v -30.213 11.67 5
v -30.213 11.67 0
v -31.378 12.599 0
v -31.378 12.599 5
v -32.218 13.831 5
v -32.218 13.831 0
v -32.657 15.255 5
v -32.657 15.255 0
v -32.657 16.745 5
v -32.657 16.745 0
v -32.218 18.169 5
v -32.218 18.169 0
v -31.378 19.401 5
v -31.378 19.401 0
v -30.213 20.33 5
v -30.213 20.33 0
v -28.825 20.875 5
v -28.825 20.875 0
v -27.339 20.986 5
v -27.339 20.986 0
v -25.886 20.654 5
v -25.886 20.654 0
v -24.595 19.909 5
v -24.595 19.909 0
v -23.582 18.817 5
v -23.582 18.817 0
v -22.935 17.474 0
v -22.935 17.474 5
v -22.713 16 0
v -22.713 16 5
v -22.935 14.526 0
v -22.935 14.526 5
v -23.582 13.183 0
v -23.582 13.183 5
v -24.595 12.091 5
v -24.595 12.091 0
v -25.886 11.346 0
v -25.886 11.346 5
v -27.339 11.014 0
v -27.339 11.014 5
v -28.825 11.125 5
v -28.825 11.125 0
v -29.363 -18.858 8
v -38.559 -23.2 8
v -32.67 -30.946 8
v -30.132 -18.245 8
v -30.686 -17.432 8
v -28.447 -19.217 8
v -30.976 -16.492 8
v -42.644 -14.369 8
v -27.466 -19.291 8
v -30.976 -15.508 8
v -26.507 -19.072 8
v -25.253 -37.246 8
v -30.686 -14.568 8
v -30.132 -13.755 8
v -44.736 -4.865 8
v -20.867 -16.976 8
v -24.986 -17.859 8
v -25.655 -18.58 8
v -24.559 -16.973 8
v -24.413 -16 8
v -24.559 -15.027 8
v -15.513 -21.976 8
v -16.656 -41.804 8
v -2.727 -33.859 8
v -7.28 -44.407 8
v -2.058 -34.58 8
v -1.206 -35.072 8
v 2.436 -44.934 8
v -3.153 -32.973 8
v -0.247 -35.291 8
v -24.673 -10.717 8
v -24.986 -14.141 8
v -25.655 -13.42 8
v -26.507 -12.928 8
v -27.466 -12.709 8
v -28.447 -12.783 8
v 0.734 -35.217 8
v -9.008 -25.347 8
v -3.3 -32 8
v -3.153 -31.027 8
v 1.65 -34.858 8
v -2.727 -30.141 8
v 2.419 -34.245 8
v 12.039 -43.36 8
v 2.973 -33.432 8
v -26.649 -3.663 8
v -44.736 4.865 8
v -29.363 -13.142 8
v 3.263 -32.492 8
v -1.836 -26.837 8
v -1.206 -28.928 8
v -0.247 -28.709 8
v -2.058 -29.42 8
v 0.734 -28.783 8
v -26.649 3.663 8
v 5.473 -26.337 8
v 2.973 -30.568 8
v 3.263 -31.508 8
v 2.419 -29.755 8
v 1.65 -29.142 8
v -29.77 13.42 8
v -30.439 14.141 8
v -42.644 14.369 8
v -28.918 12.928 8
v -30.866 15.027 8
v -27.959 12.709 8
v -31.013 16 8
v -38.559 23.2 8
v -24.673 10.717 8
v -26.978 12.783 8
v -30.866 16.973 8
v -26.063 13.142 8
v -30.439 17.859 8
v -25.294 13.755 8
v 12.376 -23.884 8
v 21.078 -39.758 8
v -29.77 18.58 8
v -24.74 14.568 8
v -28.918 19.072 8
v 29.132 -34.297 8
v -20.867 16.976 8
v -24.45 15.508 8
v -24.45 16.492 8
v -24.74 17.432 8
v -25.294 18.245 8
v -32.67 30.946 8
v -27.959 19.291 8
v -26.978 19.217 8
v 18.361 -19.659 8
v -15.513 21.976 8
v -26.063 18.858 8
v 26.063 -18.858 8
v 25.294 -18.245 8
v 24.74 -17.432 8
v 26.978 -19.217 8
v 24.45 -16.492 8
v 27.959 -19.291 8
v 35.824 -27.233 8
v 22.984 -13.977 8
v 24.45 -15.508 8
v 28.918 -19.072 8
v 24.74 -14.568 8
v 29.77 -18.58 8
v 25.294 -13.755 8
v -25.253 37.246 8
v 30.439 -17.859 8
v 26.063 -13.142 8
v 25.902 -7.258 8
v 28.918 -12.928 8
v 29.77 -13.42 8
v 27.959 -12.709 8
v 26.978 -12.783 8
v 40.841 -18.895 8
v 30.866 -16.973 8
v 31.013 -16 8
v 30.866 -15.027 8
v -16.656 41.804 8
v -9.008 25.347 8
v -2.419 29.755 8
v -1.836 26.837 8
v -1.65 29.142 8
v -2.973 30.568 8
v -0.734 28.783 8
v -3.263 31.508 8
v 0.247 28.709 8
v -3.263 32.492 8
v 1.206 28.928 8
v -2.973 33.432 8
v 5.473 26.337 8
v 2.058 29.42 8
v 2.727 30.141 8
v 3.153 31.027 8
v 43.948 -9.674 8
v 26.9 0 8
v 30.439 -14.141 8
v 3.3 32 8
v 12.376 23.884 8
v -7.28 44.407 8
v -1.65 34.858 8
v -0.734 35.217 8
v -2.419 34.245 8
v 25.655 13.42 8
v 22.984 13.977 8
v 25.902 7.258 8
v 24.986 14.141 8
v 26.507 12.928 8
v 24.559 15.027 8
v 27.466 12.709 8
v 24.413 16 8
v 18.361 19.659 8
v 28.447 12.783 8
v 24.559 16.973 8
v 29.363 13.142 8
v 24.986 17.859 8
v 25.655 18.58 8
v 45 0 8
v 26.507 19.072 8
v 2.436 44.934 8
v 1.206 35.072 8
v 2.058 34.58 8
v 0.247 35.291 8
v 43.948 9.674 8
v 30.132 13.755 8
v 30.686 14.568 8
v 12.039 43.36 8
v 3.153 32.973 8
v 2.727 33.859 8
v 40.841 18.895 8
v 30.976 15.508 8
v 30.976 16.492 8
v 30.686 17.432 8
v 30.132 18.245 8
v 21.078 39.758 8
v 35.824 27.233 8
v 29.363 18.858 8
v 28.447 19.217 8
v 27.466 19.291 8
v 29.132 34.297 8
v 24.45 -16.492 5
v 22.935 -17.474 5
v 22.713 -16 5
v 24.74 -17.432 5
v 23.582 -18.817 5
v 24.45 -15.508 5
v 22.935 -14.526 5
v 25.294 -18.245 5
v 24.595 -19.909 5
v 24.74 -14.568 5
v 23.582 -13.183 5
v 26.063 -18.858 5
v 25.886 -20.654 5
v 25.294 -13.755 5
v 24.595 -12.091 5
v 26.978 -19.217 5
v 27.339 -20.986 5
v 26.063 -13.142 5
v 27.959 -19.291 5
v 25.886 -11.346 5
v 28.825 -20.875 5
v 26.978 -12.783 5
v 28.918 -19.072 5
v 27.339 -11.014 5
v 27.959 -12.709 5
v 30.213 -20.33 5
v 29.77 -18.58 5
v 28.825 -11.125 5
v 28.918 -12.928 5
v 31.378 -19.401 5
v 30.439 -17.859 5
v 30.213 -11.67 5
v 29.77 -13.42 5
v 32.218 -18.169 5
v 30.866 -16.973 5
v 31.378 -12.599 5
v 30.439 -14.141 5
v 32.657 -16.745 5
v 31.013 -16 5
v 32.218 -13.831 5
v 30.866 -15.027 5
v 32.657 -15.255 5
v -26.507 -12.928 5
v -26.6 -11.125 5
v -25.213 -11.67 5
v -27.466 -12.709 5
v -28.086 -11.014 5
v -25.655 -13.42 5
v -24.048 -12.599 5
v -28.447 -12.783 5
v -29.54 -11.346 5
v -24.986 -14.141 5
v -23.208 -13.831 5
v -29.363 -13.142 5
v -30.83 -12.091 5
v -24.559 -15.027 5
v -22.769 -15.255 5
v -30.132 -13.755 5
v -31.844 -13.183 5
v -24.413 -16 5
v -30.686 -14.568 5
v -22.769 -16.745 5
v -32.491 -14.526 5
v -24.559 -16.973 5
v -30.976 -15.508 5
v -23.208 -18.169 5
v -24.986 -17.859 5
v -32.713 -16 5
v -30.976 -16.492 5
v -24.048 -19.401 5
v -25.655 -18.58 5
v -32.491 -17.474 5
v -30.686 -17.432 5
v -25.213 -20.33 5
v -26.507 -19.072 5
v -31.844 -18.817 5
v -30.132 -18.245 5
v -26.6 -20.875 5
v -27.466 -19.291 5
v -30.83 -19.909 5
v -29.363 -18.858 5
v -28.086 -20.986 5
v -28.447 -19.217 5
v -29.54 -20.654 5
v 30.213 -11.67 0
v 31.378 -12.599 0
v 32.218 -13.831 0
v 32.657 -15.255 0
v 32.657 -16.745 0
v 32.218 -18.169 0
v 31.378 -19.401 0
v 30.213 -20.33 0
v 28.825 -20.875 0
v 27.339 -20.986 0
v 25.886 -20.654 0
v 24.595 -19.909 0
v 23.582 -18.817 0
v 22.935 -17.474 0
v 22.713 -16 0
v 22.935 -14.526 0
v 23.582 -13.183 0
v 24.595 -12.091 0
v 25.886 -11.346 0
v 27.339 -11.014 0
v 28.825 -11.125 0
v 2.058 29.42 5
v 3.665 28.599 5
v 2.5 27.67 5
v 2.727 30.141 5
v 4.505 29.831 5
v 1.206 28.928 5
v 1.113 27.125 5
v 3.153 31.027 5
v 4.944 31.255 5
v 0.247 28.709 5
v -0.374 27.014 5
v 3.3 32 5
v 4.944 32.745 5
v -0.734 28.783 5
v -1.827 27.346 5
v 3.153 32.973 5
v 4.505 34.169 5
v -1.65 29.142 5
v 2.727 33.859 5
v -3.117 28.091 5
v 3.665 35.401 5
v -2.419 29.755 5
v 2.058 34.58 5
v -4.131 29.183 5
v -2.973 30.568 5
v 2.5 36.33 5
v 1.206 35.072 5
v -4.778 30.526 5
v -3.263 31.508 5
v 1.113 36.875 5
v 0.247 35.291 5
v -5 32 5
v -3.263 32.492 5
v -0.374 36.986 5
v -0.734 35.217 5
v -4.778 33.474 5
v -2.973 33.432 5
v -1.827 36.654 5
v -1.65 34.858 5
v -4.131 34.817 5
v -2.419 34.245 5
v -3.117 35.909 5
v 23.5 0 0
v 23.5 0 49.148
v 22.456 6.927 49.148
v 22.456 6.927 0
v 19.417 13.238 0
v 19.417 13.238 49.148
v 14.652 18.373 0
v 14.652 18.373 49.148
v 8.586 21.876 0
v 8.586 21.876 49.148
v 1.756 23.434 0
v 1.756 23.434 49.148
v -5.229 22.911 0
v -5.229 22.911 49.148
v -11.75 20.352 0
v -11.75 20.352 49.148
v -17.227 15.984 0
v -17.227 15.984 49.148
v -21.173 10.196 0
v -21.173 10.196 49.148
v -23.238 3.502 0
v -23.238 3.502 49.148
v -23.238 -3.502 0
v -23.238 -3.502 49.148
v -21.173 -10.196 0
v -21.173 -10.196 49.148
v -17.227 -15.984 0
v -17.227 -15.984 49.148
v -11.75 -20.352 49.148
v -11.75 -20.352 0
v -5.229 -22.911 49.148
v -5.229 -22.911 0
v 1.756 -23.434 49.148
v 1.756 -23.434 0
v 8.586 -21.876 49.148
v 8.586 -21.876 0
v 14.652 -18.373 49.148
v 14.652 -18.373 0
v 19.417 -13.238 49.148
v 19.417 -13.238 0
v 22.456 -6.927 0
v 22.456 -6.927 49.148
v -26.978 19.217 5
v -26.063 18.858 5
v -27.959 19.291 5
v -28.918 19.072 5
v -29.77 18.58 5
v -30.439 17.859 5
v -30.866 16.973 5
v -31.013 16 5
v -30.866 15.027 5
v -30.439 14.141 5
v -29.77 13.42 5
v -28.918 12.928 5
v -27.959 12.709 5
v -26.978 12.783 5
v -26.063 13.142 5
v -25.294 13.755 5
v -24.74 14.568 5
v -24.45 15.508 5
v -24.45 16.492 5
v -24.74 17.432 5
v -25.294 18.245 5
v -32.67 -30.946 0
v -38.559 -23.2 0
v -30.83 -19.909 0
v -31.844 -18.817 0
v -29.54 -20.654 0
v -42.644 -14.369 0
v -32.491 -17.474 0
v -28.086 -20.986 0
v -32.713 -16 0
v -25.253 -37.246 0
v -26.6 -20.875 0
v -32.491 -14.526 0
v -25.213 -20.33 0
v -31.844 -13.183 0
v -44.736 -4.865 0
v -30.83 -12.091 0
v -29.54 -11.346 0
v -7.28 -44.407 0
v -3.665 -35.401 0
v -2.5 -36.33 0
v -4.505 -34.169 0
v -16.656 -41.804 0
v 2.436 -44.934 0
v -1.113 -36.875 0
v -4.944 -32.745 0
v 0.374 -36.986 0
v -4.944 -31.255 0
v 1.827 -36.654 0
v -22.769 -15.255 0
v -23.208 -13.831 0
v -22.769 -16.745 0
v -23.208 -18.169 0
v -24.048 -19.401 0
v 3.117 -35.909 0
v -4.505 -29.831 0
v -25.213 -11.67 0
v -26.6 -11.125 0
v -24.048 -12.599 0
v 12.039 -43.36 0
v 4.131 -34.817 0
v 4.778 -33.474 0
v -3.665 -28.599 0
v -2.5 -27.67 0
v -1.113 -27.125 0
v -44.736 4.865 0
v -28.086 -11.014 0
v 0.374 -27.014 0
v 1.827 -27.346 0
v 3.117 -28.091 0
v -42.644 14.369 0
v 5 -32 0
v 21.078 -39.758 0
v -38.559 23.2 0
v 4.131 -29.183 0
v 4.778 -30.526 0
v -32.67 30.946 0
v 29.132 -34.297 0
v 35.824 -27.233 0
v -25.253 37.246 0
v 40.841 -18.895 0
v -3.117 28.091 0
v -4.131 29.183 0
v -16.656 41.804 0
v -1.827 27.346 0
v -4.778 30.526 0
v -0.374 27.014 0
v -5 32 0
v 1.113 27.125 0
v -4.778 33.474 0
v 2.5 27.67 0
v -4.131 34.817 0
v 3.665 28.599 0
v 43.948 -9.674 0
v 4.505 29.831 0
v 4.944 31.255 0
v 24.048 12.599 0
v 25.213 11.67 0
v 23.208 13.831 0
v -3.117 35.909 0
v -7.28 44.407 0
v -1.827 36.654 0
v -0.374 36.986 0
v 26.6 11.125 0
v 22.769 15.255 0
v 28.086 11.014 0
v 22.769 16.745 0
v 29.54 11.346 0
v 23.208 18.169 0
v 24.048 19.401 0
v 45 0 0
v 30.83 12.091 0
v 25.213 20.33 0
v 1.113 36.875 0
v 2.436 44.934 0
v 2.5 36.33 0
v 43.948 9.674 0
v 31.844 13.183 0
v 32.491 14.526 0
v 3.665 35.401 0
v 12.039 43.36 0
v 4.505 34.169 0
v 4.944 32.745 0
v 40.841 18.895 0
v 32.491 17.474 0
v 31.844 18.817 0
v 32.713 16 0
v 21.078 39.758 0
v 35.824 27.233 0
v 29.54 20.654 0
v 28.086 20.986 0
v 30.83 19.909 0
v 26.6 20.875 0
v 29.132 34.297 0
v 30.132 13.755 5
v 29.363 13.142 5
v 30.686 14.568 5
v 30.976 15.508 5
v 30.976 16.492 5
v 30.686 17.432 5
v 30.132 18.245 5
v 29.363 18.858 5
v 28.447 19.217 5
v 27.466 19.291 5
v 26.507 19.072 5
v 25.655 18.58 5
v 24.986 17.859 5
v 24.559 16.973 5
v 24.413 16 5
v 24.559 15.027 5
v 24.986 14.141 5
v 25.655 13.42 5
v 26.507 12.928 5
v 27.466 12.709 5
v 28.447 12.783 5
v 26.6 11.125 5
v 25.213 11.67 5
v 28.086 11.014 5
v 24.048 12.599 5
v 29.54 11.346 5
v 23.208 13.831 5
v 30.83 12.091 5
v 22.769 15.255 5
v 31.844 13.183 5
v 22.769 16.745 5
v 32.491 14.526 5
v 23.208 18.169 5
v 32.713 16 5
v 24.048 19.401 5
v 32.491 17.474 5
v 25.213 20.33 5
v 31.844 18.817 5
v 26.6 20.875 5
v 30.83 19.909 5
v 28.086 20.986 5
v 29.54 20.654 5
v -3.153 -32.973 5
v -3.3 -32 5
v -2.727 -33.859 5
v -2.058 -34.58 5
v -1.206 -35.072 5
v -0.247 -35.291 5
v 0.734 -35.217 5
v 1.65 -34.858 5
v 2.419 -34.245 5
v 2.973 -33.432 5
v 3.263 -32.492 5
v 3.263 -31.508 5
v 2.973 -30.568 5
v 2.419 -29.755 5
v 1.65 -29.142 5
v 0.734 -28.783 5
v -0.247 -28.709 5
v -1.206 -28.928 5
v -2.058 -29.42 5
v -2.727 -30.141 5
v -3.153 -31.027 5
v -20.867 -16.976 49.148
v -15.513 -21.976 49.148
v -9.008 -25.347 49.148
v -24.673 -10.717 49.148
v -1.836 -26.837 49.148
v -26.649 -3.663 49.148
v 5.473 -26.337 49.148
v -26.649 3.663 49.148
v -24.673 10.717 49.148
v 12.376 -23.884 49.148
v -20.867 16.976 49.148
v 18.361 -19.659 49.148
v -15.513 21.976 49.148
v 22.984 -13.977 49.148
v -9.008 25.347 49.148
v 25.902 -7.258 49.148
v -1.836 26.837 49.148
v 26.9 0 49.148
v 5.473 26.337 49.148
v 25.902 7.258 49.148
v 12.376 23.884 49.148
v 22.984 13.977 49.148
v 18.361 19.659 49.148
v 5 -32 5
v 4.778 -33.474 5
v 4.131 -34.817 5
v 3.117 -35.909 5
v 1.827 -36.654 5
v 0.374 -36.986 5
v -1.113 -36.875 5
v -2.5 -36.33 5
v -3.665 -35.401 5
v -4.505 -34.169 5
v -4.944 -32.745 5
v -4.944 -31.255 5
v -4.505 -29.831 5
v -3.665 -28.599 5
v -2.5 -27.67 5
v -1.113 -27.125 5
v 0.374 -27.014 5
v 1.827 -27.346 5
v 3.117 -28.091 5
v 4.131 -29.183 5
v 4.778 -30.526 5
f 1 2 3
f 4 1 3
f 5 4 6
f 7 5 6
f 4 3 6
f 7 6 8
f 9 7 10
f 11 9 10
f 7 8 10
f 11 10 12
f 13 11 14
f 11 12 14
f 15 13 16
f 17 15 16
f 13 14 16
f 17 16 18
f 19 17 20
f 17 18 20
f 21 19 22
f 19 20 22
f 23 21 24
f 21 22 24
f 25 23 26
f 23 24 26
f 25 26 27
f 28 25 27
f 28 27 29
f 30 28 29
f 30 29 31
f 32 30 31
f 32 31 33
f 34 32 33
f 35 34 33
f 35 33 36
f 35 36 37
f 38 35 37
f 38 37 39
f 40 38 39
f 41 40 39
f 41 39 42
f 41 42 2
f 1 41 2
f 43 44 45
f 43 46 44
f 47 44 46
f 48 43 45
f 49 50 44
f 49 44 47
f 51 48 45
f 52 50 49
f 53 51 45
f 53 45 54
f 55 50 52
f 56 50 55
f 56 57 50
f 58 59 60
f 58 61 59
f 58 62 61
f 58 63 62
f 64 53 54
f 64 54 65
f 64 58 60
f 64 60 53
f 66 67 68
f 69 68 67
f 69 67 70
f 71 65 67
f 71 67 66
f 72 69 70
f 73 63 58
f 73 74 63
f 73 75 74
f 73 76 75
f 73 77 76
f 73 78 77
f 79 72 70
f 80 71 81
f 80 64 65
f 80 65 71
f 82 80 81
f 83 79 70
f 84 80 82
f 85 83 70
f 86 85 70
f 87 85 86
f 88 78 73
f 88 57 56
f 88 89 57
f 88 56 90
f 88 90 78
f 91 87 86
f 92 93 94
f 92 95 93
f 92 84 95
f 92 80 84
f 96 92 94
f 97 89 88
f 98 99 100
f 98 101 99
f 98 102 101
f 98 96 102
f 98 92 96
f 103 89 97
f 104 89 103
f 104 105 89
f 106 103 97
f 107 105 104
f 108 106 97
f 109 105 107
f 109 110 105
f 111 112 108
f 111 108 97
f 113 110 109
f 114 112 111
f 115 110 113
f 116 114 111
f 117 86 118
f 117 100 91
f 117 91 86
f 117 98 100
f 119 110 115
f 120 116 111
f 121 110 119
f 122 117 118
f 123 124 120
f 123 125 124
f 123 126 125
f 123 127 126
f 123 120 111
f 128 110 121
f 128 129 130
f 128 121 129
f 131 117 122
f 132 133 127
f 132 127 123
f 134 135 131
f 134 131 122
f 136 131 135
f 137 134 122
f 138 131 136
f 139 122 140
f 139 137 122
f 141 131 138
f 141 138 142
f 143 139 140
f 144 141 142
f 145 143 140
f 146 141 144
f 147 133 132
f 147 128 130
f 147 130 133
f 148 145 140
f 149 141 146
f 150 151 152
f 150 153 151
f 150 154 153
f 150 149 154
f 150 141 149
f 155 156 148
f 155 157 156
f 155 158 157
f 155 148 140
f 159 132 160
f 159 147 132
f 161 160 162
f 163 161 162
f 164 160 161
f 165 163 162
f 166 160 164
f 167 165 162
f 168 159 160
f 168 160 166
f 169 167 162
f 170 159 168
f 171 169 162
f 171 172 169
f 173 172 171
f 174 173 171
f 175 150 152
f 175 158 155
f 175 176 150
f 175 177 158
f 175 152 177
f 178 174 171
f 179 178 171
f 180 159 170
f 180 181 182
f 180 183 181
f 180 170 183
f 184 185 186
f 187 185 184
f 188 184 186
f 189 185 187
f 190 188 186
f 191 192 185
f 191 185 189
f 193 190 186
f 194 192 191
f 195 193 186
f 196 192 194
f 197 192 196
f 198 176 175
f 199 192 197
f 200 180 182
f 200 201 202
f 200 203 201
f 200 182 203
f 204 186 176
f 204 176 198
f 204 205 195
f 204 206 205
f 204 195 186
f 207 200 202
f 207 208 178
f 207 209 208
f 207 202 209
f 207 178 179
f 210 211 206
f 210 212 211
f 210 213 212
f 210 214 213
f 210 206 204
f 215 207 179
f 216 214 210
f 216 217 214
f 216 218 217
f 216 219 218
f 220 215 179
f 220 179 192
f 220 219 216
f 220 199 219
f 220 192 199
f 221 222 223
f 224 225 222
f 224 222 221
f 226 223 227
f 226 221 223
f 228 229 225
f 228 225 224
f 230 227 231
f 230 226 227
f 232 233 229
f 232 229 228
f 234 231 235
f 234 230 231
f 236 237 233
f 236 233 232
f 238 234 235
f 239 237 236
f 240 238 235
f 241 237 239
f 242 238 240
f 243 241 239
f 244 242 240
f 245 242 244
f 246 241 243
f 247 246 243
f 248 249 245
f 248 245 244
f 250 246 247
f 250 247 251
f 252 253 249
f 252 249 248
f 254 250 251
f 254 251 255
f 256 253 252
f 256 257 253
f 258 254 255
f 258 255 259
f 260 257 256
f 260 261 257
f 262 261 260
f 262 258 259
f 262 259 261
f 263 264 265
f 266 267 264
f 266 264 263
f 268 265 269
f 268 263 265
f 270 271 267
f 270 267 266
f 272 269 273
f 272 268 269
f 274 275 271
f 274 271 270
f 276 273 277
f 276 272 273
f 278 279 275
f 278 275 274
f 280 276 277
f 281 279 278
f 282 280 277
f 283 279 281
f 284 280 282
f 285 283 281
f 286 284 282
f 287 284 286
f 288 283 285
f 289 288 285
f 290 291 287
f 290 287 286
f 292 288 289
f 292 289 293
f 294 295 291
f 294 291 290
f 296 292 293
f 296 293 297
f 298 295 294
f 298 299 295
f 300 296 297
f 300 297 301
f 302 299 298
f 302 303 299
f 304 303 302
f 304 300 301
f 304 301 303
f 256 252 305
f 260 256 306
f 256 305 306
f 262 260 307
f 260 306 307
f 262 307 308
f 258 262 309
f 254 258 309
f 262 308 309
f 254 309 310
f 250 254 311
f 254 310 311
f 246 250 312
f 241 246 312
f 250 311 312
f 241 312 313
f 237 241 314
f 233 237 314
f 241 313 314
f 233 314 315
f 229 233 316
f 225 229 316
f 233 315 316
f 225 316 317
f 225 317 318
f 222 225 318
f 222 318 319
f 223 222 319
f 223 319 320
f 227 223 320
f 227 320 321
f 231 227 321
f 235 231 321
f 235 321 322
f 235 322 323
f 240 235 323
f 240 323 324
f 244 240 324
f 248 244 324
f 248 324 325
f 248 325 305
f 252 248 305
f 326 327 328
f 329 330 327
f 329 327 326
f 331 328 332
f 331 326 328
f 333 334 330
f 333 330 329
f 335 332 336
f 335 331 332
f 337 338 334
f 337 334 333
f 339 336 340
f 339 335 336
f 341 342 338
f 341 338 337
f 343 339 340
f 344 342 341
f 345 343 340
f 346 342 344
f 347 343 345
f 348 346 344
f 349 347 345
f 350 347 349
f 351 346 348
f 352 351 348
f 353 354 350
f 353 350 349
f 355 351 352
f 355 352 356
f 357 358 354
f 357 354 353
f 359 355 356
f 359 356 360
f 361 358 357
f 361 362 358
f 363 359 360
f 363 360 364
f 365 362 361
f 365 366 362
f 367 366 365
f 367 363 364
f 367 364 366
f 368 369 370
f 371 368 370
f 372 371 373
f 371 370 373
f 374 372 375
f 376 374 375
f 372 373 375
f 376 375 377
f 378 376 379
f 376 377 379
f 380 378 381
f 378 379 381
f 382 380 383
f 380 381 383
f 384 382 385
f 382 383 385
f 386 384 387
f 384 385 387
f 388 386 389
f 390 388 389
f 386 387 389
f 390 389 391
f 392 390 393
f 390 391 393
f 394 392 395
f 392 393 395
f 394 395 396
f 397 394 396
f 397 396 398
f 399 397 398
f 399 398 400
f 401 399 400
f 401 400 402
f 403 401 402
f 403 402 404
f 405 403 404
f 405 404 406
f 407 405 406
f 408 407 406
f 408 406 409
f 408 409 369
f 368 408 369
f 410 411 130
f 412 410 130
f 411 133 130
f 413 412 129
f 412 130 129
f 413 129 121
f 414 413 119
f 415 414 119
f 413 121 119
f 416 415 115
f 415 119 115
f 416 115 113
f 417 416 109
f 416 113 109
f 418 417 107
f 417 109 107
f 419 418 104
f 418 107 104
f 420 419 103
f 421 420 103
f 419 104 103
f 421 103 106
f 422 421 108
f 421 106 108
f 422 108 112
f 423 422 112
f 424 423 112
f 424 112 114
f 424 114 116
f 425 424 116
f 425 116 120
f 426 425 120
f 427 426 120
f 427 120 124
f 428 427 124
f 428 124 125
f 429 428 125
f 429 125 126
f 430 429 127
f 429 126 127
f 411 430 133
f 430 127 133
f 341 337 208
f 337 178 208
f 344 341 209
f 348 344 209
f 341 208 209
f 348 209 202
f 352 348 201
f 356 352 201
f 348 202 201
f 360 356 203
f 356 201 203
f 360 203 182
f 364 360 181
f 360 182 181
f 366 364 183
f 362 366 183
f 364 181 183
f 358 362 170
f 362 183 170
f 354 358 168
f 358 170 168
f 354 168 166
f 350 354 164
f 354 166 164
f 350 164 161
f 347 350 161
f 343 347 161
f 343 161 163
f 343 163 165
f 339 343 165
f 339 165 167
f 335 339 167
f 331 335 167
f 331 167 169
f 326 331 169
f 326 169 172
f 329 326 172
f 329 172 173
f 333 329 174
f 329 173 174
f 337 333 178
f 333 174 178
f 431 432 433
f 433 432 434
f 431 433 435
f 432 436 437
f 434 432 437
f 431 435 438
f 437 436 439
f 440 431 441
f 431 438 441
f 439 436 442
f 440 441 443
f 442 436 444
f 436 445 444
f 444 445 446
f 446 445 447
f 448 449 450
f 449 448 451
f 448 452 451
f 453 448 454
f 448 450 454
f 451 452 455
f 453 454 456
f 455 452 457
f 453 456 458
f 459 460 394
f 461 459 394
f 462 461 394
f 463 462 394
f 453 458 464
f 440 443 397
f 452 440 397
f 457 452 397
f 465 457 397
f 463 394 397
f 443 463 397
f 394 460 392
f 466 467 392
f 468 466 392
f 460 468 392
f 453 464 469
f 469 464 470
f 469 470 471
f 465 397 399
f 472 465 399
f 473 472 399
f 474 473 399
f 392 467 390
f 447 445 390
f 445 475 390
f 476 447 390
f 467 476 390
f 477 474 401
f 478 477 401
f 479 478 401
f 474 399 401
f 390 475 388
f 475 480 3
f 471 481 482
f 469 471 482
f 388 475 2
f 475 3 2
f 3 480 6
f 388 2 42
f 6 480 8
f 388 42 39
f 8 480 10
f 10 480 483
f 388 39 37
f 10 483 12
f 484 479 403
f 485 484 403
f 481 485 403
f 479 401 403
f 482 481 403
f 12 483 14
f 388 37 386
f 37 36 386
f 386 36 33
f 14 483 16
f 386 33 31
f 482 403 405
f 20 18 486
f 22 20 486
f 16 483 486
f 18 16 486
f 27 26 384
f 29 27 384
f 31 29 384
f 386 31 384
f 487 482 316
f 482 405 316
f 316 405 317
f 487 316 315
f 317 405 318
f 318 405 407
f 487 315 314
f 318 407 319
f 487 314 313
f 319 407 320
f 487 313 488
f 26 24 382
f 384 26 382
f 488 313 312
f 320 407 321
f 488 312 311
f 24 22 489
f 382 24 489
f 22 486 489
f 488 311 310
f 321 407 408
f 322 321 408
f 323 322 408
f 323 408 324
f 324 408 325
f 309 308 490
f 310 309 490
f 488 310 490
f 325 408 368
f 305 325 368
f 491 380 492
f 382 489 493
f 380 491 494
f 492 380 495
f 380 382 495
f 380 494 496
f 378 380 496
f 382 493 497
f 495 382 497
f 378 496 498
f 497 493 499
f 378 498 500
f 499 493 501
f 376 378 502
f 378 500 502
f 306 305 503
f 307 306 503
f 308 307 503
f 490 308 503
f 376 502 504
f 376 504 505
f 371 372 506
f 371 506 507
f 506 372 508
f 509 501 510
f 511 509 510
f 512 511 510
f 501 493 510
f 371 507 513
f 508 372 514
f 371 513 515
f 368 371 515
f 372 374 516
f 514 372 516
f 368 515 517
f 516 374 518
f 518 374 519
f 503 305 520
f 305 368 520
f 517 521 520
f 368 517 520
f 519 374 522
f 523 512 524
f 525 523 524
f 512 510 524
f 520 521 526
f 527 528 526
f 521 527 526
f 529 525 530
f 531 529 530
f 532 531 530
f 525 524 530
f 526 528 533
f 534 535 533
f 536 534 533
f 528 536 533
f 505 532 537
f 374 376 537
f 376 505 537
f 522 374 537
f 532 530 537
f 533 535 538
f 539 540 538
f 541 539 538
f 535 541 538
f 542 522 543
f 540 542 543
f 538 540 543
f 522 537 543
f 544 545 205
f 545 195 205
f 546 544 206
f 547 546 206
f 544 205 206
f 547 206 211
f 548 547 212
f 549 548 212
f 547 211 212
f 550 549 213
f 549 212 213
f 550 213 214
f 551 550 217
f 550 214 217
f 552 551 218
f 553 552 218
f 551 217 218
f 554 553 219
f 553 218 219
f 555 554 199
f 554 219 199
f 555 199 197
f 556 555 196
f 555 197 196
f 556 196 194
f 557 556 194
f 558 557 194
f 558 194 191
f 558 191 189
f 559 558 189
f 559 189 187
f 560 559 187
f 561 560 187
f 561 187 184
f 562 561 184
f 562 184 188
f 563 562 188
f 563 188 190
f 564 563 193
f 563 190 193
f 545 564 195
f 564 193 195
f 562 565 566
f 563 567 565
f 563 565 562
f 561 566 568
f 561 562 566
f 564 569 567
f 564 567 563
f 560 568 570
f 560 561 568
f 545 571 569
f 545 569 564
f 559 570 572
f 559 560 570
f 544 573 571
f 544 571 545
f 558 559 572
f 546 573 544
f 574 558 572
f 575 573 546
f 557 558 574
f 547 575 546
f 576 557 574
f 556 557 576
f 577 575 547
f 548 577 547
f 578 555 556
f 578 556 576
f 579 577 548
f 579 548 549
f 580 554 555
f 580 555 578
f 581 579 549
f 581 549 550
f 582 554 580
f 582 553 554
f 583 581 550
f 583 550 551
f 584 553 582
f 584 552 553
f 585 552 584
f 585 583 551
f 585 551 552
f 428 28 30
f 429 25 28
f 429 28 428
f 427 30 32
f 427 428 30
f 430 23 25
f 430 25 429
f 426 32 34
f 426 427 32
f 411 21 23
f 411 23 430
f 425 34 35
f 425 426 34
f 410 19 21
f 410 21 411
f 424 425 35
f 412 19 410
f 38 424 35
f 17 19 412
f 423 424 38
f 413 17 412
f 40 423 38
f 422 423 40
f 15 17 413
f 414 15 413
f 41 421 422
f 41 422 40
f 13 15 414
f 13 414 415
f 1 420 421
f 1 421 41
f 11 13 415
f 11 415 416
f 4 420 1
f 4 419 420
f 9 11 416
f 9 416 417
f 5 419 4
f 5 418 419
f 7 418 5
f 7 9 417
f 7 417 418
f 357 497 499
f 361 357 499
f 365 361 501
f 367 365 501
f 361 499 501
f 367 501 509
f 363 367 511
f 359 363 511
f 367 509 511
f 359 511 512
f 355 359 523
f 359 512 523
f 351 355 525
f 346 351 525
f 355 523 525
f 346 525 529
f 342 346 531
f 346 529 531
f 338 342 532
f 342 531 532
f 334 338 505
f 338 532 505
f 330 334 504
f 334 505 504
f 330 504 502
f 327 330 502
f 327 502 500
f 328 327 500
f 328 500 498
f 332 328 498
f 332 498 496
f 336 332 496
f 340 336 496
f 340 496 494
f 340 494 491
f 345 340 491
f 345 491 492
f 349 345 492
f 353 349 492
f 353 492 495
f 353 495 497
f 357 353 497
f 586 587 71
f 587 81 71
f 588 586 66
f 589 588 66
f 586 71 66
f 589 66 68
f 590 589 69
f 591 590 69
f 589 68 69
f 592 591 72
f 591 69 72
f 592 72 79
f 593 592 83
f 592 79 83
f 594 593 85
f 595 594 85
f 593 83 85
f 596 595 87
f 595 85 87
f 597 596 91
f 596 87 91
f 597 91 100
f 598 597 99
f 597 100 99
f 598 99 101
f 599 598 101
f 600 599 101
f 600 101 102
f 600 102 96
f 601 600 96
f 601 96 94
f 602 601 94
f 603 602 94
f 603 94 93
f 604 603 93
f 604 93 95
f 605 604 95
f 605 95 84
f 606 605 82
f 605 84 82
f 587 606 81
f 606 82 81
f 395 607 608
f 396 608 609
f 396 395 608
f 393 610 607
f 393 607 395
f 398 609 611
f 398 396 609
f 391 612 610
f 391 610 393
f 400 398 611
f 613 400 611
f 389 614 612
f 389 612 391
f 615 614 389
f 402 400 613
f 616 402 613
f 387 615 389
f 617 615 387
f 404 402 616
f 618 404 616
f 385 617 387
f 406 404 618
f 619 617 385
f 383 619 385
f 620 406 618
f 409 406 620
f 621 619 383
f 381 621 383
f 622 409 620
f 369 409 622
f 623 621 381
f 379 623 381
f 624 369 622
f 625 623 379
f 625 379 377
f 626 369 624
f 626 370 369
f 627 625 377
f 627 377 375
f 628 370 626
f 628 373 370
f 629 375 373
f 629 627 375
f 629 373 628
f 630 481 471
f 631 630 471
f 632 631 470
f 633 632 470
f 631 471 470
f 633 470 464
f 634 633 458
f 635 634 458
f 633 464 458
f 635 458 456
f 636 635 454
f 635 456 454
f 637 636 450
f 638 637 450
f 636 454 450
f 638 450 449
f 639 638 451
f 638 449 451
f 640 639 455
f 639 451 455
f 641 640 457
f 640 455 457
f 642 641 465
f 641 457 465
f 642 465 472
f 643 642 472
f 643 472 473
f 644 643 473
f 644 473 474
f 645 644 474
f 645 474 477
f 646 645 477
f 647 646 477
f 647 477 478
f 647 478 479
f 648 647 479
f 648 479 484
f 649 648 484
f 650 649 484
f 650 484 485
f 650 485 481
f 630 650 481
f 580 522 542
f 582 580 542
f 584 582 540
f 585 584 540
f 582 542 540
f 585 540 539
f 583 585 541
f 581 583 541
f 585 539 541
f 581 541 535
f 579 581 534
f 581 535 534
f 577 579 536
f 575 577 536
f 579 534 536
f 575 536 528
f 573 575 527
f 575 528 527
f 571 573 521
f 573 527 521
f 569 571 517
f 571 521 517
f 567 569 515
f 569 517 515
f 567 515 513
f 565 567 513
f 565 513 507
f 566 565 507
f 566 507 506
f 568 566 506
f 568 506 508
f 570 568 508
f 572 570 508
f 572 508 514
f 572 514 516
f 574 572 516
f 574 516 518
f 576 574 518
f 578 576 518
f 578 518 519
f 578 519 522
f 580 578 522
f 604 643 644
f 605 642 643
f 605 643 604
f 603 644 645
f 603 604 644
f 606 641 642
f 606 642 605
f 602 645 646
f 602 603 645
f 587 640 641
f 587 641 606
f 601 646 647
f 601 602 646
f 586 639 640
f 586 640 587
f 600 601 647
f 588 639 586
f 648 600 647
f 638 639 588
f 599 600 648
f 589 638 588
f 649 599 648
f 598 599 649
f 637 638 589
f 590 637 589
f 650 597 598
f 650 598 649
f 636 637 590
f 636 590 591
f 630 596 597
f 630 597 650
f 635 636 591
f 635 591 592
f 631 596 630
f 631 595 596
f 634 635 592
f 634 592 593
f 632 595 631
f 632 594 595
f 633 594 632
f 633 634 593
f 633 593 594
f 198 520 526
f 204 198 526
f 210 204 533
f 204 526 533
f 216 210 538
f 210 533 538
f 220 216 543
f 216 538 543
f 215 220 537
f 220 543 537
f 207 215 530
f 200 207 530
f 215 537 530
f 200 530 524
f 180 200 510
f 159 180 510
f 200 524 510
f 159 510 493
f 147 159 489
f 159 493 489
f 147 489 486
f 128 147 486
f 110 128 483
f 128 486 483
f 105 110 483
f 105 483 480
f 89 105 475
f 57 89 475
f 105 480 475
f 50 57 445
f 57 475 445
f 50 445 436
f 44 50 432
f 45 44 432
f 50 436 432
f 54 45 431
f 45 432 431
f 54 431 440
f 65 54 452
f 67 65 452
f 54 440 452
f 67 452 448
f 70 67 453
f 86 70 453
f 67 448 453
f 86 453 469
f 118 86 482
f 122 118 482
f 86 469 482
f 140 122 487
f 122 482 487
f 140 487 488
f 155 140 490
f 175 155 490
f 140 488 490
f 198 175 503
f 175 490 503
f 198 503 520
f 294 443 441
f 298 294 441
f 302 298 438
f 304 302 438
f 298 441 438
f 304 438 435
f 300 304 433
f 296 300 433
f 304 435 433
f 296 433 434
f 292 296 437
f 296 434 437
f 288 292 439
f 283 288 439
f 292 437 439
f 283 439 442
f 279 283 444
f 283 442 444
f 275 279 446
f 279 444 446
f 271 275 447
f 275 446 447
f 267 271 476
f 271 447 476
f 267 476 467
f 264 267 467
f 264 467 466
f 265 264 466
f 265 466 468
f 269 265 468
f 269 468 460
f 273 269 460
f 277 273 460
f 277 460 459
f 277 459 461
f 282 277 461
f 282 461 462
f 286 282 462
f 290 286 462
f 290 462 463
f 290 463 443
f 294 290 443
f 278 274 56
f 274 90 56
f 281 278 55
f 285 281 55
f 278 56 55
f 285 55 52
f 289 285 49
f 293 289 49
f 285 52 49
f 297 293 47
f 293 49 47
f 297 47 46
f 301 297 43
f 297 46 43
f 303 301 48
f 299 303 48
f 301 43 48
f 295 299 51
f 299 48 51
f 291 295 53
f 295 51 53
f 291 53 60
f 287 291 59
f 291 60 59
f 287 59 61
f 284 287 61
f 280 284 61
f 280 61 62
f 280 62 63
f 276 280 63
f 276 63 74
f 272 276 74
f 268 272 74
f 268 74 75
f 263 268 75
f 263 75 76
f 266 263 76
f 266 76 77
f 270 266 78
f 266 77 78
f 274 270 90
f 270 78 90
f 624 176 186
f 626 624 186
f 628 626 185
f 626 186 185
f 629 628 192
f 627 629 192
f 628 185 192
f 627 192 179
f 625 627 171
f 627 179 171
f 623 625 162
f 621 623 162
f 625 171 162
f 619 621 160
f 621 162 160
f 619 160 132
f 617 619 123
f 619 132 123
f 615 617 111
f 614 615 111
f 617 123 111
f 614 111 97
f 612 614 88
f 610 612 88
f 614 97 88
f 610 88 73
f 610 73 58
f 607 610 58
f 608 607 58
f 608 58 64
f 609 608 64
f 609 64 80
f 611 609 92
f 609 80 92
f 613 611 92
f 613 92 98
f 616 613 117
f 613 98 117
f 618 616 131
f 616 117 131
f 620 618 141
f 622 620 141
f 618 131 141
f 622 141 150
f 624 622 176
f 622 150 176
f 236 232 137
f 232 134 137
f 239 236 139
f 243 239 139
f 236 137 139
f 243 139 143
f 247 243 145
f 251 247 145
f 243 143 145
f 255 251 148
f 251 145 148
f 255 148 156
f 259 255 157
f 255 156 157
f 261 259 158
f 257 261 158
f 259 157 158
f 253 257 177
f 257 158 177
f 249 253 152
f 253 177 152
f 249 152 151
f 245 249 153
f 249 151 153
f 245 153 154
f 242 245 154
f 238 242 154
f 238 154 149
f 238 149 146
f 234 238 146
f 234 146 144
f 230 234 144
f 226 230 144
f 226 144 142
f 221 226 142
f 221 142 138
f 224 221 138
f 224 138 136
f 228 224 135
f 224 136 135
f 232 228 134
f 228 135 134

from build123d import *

# Parameters (mm, degrees)
SKETCH2_R                               = 45
BOSS_EXTRUDE1_DEPTH                     = 8
SKETCH5_R                               = 23.5
CUT_EXTRUDE1_DEPTH                      = 9
SKETCH6_R                               = 26.9
BOSS_EXTRUDE2_DEPTH                     = 41.148
SKETCH7_R                               = 23.5
CUT_EXTRUDE3_DEPTH                      = 50.148
CBORE_FOR_M8_HEX_HEAD_BOLT1_D           = 6.6
CBORE_FOR_M8_HEX_HEAD_BOLT1_CBORE_D     = 10
CBORE_FOR_M8_HEX_HEAD_BOLT1_CBORE_DEPTH = 5
CIRPATTERN1_COUNT                       = 6


with BuildPart() as part:
    # Sketch2 → Boss-Extrude1 (new body)
    with BuildSketch(Plane.XY):
        Circle(SKETCH2_R)
    extrude(amount=BOSS_EXTRUDE1_DEPTH)

    # Sketch5 → Cut-Extrude1 (cut, through all)
    with BuildSketch(Plane.XY.offset(8)):
        Circle(SKETCH5_R)
    extrude(amount=-CUT_EXTRUDE1_DEPTH, mode=Mode.SUBTRACT)

    # Sketch6 → Boss-Extrude2 (add)
    with BuildSketch(Plane.XY.offset(8)):
        Circle(SKETCH6_R)
    extrude(amount=BOSS_EXTRUDE2_DEPTH)

    # Sketch7 → Cut-Extrude3 (cut, through all)
    with BuildSketch(Plane.XY.offset(49.148)):
        Circle(SKETCH7_R)
    extrude(amount=-CUT_EXTRUDE3_DEPTH, mode=Mode.SUBTRACT)

    # CBORE for M8 Hex Head Bolt1 (through all)
    with Locations(Plane(origin=(0, 32, 0), x_dir=(-1, 0, 0), z_dir=(0, 0, -1))):
        with Locations((0, 0)):
            cbore_for_m8_hex_head_bolt1 = CounterBoreHole(CBORE_FOR_M8_HEX_HEAD_BOLT1_D / 2, CBORE_FOR_M8_HEX_HEAD_BOLT1_CBORE_D / 2, CBORE_FOR_M8_HEX_HEAD_BOLT1_CBORE_DEPTH)

    # CirPattern1: CBORE for M8 Hex Head Bolt1 ×6 about axis
    cirpattern1_axis = Axis((0, 0, 0), (0, 0, 1))
    for i in range(1, CIRPATTERN1_COUNT):
        add(cbore_for_m8_hex_head_bolt1.rotate(cirpattern1_axis, i * 360 / CIRPATTERN1_COUNT), mode=Mode.SUBTRACT)


solid = part.part
